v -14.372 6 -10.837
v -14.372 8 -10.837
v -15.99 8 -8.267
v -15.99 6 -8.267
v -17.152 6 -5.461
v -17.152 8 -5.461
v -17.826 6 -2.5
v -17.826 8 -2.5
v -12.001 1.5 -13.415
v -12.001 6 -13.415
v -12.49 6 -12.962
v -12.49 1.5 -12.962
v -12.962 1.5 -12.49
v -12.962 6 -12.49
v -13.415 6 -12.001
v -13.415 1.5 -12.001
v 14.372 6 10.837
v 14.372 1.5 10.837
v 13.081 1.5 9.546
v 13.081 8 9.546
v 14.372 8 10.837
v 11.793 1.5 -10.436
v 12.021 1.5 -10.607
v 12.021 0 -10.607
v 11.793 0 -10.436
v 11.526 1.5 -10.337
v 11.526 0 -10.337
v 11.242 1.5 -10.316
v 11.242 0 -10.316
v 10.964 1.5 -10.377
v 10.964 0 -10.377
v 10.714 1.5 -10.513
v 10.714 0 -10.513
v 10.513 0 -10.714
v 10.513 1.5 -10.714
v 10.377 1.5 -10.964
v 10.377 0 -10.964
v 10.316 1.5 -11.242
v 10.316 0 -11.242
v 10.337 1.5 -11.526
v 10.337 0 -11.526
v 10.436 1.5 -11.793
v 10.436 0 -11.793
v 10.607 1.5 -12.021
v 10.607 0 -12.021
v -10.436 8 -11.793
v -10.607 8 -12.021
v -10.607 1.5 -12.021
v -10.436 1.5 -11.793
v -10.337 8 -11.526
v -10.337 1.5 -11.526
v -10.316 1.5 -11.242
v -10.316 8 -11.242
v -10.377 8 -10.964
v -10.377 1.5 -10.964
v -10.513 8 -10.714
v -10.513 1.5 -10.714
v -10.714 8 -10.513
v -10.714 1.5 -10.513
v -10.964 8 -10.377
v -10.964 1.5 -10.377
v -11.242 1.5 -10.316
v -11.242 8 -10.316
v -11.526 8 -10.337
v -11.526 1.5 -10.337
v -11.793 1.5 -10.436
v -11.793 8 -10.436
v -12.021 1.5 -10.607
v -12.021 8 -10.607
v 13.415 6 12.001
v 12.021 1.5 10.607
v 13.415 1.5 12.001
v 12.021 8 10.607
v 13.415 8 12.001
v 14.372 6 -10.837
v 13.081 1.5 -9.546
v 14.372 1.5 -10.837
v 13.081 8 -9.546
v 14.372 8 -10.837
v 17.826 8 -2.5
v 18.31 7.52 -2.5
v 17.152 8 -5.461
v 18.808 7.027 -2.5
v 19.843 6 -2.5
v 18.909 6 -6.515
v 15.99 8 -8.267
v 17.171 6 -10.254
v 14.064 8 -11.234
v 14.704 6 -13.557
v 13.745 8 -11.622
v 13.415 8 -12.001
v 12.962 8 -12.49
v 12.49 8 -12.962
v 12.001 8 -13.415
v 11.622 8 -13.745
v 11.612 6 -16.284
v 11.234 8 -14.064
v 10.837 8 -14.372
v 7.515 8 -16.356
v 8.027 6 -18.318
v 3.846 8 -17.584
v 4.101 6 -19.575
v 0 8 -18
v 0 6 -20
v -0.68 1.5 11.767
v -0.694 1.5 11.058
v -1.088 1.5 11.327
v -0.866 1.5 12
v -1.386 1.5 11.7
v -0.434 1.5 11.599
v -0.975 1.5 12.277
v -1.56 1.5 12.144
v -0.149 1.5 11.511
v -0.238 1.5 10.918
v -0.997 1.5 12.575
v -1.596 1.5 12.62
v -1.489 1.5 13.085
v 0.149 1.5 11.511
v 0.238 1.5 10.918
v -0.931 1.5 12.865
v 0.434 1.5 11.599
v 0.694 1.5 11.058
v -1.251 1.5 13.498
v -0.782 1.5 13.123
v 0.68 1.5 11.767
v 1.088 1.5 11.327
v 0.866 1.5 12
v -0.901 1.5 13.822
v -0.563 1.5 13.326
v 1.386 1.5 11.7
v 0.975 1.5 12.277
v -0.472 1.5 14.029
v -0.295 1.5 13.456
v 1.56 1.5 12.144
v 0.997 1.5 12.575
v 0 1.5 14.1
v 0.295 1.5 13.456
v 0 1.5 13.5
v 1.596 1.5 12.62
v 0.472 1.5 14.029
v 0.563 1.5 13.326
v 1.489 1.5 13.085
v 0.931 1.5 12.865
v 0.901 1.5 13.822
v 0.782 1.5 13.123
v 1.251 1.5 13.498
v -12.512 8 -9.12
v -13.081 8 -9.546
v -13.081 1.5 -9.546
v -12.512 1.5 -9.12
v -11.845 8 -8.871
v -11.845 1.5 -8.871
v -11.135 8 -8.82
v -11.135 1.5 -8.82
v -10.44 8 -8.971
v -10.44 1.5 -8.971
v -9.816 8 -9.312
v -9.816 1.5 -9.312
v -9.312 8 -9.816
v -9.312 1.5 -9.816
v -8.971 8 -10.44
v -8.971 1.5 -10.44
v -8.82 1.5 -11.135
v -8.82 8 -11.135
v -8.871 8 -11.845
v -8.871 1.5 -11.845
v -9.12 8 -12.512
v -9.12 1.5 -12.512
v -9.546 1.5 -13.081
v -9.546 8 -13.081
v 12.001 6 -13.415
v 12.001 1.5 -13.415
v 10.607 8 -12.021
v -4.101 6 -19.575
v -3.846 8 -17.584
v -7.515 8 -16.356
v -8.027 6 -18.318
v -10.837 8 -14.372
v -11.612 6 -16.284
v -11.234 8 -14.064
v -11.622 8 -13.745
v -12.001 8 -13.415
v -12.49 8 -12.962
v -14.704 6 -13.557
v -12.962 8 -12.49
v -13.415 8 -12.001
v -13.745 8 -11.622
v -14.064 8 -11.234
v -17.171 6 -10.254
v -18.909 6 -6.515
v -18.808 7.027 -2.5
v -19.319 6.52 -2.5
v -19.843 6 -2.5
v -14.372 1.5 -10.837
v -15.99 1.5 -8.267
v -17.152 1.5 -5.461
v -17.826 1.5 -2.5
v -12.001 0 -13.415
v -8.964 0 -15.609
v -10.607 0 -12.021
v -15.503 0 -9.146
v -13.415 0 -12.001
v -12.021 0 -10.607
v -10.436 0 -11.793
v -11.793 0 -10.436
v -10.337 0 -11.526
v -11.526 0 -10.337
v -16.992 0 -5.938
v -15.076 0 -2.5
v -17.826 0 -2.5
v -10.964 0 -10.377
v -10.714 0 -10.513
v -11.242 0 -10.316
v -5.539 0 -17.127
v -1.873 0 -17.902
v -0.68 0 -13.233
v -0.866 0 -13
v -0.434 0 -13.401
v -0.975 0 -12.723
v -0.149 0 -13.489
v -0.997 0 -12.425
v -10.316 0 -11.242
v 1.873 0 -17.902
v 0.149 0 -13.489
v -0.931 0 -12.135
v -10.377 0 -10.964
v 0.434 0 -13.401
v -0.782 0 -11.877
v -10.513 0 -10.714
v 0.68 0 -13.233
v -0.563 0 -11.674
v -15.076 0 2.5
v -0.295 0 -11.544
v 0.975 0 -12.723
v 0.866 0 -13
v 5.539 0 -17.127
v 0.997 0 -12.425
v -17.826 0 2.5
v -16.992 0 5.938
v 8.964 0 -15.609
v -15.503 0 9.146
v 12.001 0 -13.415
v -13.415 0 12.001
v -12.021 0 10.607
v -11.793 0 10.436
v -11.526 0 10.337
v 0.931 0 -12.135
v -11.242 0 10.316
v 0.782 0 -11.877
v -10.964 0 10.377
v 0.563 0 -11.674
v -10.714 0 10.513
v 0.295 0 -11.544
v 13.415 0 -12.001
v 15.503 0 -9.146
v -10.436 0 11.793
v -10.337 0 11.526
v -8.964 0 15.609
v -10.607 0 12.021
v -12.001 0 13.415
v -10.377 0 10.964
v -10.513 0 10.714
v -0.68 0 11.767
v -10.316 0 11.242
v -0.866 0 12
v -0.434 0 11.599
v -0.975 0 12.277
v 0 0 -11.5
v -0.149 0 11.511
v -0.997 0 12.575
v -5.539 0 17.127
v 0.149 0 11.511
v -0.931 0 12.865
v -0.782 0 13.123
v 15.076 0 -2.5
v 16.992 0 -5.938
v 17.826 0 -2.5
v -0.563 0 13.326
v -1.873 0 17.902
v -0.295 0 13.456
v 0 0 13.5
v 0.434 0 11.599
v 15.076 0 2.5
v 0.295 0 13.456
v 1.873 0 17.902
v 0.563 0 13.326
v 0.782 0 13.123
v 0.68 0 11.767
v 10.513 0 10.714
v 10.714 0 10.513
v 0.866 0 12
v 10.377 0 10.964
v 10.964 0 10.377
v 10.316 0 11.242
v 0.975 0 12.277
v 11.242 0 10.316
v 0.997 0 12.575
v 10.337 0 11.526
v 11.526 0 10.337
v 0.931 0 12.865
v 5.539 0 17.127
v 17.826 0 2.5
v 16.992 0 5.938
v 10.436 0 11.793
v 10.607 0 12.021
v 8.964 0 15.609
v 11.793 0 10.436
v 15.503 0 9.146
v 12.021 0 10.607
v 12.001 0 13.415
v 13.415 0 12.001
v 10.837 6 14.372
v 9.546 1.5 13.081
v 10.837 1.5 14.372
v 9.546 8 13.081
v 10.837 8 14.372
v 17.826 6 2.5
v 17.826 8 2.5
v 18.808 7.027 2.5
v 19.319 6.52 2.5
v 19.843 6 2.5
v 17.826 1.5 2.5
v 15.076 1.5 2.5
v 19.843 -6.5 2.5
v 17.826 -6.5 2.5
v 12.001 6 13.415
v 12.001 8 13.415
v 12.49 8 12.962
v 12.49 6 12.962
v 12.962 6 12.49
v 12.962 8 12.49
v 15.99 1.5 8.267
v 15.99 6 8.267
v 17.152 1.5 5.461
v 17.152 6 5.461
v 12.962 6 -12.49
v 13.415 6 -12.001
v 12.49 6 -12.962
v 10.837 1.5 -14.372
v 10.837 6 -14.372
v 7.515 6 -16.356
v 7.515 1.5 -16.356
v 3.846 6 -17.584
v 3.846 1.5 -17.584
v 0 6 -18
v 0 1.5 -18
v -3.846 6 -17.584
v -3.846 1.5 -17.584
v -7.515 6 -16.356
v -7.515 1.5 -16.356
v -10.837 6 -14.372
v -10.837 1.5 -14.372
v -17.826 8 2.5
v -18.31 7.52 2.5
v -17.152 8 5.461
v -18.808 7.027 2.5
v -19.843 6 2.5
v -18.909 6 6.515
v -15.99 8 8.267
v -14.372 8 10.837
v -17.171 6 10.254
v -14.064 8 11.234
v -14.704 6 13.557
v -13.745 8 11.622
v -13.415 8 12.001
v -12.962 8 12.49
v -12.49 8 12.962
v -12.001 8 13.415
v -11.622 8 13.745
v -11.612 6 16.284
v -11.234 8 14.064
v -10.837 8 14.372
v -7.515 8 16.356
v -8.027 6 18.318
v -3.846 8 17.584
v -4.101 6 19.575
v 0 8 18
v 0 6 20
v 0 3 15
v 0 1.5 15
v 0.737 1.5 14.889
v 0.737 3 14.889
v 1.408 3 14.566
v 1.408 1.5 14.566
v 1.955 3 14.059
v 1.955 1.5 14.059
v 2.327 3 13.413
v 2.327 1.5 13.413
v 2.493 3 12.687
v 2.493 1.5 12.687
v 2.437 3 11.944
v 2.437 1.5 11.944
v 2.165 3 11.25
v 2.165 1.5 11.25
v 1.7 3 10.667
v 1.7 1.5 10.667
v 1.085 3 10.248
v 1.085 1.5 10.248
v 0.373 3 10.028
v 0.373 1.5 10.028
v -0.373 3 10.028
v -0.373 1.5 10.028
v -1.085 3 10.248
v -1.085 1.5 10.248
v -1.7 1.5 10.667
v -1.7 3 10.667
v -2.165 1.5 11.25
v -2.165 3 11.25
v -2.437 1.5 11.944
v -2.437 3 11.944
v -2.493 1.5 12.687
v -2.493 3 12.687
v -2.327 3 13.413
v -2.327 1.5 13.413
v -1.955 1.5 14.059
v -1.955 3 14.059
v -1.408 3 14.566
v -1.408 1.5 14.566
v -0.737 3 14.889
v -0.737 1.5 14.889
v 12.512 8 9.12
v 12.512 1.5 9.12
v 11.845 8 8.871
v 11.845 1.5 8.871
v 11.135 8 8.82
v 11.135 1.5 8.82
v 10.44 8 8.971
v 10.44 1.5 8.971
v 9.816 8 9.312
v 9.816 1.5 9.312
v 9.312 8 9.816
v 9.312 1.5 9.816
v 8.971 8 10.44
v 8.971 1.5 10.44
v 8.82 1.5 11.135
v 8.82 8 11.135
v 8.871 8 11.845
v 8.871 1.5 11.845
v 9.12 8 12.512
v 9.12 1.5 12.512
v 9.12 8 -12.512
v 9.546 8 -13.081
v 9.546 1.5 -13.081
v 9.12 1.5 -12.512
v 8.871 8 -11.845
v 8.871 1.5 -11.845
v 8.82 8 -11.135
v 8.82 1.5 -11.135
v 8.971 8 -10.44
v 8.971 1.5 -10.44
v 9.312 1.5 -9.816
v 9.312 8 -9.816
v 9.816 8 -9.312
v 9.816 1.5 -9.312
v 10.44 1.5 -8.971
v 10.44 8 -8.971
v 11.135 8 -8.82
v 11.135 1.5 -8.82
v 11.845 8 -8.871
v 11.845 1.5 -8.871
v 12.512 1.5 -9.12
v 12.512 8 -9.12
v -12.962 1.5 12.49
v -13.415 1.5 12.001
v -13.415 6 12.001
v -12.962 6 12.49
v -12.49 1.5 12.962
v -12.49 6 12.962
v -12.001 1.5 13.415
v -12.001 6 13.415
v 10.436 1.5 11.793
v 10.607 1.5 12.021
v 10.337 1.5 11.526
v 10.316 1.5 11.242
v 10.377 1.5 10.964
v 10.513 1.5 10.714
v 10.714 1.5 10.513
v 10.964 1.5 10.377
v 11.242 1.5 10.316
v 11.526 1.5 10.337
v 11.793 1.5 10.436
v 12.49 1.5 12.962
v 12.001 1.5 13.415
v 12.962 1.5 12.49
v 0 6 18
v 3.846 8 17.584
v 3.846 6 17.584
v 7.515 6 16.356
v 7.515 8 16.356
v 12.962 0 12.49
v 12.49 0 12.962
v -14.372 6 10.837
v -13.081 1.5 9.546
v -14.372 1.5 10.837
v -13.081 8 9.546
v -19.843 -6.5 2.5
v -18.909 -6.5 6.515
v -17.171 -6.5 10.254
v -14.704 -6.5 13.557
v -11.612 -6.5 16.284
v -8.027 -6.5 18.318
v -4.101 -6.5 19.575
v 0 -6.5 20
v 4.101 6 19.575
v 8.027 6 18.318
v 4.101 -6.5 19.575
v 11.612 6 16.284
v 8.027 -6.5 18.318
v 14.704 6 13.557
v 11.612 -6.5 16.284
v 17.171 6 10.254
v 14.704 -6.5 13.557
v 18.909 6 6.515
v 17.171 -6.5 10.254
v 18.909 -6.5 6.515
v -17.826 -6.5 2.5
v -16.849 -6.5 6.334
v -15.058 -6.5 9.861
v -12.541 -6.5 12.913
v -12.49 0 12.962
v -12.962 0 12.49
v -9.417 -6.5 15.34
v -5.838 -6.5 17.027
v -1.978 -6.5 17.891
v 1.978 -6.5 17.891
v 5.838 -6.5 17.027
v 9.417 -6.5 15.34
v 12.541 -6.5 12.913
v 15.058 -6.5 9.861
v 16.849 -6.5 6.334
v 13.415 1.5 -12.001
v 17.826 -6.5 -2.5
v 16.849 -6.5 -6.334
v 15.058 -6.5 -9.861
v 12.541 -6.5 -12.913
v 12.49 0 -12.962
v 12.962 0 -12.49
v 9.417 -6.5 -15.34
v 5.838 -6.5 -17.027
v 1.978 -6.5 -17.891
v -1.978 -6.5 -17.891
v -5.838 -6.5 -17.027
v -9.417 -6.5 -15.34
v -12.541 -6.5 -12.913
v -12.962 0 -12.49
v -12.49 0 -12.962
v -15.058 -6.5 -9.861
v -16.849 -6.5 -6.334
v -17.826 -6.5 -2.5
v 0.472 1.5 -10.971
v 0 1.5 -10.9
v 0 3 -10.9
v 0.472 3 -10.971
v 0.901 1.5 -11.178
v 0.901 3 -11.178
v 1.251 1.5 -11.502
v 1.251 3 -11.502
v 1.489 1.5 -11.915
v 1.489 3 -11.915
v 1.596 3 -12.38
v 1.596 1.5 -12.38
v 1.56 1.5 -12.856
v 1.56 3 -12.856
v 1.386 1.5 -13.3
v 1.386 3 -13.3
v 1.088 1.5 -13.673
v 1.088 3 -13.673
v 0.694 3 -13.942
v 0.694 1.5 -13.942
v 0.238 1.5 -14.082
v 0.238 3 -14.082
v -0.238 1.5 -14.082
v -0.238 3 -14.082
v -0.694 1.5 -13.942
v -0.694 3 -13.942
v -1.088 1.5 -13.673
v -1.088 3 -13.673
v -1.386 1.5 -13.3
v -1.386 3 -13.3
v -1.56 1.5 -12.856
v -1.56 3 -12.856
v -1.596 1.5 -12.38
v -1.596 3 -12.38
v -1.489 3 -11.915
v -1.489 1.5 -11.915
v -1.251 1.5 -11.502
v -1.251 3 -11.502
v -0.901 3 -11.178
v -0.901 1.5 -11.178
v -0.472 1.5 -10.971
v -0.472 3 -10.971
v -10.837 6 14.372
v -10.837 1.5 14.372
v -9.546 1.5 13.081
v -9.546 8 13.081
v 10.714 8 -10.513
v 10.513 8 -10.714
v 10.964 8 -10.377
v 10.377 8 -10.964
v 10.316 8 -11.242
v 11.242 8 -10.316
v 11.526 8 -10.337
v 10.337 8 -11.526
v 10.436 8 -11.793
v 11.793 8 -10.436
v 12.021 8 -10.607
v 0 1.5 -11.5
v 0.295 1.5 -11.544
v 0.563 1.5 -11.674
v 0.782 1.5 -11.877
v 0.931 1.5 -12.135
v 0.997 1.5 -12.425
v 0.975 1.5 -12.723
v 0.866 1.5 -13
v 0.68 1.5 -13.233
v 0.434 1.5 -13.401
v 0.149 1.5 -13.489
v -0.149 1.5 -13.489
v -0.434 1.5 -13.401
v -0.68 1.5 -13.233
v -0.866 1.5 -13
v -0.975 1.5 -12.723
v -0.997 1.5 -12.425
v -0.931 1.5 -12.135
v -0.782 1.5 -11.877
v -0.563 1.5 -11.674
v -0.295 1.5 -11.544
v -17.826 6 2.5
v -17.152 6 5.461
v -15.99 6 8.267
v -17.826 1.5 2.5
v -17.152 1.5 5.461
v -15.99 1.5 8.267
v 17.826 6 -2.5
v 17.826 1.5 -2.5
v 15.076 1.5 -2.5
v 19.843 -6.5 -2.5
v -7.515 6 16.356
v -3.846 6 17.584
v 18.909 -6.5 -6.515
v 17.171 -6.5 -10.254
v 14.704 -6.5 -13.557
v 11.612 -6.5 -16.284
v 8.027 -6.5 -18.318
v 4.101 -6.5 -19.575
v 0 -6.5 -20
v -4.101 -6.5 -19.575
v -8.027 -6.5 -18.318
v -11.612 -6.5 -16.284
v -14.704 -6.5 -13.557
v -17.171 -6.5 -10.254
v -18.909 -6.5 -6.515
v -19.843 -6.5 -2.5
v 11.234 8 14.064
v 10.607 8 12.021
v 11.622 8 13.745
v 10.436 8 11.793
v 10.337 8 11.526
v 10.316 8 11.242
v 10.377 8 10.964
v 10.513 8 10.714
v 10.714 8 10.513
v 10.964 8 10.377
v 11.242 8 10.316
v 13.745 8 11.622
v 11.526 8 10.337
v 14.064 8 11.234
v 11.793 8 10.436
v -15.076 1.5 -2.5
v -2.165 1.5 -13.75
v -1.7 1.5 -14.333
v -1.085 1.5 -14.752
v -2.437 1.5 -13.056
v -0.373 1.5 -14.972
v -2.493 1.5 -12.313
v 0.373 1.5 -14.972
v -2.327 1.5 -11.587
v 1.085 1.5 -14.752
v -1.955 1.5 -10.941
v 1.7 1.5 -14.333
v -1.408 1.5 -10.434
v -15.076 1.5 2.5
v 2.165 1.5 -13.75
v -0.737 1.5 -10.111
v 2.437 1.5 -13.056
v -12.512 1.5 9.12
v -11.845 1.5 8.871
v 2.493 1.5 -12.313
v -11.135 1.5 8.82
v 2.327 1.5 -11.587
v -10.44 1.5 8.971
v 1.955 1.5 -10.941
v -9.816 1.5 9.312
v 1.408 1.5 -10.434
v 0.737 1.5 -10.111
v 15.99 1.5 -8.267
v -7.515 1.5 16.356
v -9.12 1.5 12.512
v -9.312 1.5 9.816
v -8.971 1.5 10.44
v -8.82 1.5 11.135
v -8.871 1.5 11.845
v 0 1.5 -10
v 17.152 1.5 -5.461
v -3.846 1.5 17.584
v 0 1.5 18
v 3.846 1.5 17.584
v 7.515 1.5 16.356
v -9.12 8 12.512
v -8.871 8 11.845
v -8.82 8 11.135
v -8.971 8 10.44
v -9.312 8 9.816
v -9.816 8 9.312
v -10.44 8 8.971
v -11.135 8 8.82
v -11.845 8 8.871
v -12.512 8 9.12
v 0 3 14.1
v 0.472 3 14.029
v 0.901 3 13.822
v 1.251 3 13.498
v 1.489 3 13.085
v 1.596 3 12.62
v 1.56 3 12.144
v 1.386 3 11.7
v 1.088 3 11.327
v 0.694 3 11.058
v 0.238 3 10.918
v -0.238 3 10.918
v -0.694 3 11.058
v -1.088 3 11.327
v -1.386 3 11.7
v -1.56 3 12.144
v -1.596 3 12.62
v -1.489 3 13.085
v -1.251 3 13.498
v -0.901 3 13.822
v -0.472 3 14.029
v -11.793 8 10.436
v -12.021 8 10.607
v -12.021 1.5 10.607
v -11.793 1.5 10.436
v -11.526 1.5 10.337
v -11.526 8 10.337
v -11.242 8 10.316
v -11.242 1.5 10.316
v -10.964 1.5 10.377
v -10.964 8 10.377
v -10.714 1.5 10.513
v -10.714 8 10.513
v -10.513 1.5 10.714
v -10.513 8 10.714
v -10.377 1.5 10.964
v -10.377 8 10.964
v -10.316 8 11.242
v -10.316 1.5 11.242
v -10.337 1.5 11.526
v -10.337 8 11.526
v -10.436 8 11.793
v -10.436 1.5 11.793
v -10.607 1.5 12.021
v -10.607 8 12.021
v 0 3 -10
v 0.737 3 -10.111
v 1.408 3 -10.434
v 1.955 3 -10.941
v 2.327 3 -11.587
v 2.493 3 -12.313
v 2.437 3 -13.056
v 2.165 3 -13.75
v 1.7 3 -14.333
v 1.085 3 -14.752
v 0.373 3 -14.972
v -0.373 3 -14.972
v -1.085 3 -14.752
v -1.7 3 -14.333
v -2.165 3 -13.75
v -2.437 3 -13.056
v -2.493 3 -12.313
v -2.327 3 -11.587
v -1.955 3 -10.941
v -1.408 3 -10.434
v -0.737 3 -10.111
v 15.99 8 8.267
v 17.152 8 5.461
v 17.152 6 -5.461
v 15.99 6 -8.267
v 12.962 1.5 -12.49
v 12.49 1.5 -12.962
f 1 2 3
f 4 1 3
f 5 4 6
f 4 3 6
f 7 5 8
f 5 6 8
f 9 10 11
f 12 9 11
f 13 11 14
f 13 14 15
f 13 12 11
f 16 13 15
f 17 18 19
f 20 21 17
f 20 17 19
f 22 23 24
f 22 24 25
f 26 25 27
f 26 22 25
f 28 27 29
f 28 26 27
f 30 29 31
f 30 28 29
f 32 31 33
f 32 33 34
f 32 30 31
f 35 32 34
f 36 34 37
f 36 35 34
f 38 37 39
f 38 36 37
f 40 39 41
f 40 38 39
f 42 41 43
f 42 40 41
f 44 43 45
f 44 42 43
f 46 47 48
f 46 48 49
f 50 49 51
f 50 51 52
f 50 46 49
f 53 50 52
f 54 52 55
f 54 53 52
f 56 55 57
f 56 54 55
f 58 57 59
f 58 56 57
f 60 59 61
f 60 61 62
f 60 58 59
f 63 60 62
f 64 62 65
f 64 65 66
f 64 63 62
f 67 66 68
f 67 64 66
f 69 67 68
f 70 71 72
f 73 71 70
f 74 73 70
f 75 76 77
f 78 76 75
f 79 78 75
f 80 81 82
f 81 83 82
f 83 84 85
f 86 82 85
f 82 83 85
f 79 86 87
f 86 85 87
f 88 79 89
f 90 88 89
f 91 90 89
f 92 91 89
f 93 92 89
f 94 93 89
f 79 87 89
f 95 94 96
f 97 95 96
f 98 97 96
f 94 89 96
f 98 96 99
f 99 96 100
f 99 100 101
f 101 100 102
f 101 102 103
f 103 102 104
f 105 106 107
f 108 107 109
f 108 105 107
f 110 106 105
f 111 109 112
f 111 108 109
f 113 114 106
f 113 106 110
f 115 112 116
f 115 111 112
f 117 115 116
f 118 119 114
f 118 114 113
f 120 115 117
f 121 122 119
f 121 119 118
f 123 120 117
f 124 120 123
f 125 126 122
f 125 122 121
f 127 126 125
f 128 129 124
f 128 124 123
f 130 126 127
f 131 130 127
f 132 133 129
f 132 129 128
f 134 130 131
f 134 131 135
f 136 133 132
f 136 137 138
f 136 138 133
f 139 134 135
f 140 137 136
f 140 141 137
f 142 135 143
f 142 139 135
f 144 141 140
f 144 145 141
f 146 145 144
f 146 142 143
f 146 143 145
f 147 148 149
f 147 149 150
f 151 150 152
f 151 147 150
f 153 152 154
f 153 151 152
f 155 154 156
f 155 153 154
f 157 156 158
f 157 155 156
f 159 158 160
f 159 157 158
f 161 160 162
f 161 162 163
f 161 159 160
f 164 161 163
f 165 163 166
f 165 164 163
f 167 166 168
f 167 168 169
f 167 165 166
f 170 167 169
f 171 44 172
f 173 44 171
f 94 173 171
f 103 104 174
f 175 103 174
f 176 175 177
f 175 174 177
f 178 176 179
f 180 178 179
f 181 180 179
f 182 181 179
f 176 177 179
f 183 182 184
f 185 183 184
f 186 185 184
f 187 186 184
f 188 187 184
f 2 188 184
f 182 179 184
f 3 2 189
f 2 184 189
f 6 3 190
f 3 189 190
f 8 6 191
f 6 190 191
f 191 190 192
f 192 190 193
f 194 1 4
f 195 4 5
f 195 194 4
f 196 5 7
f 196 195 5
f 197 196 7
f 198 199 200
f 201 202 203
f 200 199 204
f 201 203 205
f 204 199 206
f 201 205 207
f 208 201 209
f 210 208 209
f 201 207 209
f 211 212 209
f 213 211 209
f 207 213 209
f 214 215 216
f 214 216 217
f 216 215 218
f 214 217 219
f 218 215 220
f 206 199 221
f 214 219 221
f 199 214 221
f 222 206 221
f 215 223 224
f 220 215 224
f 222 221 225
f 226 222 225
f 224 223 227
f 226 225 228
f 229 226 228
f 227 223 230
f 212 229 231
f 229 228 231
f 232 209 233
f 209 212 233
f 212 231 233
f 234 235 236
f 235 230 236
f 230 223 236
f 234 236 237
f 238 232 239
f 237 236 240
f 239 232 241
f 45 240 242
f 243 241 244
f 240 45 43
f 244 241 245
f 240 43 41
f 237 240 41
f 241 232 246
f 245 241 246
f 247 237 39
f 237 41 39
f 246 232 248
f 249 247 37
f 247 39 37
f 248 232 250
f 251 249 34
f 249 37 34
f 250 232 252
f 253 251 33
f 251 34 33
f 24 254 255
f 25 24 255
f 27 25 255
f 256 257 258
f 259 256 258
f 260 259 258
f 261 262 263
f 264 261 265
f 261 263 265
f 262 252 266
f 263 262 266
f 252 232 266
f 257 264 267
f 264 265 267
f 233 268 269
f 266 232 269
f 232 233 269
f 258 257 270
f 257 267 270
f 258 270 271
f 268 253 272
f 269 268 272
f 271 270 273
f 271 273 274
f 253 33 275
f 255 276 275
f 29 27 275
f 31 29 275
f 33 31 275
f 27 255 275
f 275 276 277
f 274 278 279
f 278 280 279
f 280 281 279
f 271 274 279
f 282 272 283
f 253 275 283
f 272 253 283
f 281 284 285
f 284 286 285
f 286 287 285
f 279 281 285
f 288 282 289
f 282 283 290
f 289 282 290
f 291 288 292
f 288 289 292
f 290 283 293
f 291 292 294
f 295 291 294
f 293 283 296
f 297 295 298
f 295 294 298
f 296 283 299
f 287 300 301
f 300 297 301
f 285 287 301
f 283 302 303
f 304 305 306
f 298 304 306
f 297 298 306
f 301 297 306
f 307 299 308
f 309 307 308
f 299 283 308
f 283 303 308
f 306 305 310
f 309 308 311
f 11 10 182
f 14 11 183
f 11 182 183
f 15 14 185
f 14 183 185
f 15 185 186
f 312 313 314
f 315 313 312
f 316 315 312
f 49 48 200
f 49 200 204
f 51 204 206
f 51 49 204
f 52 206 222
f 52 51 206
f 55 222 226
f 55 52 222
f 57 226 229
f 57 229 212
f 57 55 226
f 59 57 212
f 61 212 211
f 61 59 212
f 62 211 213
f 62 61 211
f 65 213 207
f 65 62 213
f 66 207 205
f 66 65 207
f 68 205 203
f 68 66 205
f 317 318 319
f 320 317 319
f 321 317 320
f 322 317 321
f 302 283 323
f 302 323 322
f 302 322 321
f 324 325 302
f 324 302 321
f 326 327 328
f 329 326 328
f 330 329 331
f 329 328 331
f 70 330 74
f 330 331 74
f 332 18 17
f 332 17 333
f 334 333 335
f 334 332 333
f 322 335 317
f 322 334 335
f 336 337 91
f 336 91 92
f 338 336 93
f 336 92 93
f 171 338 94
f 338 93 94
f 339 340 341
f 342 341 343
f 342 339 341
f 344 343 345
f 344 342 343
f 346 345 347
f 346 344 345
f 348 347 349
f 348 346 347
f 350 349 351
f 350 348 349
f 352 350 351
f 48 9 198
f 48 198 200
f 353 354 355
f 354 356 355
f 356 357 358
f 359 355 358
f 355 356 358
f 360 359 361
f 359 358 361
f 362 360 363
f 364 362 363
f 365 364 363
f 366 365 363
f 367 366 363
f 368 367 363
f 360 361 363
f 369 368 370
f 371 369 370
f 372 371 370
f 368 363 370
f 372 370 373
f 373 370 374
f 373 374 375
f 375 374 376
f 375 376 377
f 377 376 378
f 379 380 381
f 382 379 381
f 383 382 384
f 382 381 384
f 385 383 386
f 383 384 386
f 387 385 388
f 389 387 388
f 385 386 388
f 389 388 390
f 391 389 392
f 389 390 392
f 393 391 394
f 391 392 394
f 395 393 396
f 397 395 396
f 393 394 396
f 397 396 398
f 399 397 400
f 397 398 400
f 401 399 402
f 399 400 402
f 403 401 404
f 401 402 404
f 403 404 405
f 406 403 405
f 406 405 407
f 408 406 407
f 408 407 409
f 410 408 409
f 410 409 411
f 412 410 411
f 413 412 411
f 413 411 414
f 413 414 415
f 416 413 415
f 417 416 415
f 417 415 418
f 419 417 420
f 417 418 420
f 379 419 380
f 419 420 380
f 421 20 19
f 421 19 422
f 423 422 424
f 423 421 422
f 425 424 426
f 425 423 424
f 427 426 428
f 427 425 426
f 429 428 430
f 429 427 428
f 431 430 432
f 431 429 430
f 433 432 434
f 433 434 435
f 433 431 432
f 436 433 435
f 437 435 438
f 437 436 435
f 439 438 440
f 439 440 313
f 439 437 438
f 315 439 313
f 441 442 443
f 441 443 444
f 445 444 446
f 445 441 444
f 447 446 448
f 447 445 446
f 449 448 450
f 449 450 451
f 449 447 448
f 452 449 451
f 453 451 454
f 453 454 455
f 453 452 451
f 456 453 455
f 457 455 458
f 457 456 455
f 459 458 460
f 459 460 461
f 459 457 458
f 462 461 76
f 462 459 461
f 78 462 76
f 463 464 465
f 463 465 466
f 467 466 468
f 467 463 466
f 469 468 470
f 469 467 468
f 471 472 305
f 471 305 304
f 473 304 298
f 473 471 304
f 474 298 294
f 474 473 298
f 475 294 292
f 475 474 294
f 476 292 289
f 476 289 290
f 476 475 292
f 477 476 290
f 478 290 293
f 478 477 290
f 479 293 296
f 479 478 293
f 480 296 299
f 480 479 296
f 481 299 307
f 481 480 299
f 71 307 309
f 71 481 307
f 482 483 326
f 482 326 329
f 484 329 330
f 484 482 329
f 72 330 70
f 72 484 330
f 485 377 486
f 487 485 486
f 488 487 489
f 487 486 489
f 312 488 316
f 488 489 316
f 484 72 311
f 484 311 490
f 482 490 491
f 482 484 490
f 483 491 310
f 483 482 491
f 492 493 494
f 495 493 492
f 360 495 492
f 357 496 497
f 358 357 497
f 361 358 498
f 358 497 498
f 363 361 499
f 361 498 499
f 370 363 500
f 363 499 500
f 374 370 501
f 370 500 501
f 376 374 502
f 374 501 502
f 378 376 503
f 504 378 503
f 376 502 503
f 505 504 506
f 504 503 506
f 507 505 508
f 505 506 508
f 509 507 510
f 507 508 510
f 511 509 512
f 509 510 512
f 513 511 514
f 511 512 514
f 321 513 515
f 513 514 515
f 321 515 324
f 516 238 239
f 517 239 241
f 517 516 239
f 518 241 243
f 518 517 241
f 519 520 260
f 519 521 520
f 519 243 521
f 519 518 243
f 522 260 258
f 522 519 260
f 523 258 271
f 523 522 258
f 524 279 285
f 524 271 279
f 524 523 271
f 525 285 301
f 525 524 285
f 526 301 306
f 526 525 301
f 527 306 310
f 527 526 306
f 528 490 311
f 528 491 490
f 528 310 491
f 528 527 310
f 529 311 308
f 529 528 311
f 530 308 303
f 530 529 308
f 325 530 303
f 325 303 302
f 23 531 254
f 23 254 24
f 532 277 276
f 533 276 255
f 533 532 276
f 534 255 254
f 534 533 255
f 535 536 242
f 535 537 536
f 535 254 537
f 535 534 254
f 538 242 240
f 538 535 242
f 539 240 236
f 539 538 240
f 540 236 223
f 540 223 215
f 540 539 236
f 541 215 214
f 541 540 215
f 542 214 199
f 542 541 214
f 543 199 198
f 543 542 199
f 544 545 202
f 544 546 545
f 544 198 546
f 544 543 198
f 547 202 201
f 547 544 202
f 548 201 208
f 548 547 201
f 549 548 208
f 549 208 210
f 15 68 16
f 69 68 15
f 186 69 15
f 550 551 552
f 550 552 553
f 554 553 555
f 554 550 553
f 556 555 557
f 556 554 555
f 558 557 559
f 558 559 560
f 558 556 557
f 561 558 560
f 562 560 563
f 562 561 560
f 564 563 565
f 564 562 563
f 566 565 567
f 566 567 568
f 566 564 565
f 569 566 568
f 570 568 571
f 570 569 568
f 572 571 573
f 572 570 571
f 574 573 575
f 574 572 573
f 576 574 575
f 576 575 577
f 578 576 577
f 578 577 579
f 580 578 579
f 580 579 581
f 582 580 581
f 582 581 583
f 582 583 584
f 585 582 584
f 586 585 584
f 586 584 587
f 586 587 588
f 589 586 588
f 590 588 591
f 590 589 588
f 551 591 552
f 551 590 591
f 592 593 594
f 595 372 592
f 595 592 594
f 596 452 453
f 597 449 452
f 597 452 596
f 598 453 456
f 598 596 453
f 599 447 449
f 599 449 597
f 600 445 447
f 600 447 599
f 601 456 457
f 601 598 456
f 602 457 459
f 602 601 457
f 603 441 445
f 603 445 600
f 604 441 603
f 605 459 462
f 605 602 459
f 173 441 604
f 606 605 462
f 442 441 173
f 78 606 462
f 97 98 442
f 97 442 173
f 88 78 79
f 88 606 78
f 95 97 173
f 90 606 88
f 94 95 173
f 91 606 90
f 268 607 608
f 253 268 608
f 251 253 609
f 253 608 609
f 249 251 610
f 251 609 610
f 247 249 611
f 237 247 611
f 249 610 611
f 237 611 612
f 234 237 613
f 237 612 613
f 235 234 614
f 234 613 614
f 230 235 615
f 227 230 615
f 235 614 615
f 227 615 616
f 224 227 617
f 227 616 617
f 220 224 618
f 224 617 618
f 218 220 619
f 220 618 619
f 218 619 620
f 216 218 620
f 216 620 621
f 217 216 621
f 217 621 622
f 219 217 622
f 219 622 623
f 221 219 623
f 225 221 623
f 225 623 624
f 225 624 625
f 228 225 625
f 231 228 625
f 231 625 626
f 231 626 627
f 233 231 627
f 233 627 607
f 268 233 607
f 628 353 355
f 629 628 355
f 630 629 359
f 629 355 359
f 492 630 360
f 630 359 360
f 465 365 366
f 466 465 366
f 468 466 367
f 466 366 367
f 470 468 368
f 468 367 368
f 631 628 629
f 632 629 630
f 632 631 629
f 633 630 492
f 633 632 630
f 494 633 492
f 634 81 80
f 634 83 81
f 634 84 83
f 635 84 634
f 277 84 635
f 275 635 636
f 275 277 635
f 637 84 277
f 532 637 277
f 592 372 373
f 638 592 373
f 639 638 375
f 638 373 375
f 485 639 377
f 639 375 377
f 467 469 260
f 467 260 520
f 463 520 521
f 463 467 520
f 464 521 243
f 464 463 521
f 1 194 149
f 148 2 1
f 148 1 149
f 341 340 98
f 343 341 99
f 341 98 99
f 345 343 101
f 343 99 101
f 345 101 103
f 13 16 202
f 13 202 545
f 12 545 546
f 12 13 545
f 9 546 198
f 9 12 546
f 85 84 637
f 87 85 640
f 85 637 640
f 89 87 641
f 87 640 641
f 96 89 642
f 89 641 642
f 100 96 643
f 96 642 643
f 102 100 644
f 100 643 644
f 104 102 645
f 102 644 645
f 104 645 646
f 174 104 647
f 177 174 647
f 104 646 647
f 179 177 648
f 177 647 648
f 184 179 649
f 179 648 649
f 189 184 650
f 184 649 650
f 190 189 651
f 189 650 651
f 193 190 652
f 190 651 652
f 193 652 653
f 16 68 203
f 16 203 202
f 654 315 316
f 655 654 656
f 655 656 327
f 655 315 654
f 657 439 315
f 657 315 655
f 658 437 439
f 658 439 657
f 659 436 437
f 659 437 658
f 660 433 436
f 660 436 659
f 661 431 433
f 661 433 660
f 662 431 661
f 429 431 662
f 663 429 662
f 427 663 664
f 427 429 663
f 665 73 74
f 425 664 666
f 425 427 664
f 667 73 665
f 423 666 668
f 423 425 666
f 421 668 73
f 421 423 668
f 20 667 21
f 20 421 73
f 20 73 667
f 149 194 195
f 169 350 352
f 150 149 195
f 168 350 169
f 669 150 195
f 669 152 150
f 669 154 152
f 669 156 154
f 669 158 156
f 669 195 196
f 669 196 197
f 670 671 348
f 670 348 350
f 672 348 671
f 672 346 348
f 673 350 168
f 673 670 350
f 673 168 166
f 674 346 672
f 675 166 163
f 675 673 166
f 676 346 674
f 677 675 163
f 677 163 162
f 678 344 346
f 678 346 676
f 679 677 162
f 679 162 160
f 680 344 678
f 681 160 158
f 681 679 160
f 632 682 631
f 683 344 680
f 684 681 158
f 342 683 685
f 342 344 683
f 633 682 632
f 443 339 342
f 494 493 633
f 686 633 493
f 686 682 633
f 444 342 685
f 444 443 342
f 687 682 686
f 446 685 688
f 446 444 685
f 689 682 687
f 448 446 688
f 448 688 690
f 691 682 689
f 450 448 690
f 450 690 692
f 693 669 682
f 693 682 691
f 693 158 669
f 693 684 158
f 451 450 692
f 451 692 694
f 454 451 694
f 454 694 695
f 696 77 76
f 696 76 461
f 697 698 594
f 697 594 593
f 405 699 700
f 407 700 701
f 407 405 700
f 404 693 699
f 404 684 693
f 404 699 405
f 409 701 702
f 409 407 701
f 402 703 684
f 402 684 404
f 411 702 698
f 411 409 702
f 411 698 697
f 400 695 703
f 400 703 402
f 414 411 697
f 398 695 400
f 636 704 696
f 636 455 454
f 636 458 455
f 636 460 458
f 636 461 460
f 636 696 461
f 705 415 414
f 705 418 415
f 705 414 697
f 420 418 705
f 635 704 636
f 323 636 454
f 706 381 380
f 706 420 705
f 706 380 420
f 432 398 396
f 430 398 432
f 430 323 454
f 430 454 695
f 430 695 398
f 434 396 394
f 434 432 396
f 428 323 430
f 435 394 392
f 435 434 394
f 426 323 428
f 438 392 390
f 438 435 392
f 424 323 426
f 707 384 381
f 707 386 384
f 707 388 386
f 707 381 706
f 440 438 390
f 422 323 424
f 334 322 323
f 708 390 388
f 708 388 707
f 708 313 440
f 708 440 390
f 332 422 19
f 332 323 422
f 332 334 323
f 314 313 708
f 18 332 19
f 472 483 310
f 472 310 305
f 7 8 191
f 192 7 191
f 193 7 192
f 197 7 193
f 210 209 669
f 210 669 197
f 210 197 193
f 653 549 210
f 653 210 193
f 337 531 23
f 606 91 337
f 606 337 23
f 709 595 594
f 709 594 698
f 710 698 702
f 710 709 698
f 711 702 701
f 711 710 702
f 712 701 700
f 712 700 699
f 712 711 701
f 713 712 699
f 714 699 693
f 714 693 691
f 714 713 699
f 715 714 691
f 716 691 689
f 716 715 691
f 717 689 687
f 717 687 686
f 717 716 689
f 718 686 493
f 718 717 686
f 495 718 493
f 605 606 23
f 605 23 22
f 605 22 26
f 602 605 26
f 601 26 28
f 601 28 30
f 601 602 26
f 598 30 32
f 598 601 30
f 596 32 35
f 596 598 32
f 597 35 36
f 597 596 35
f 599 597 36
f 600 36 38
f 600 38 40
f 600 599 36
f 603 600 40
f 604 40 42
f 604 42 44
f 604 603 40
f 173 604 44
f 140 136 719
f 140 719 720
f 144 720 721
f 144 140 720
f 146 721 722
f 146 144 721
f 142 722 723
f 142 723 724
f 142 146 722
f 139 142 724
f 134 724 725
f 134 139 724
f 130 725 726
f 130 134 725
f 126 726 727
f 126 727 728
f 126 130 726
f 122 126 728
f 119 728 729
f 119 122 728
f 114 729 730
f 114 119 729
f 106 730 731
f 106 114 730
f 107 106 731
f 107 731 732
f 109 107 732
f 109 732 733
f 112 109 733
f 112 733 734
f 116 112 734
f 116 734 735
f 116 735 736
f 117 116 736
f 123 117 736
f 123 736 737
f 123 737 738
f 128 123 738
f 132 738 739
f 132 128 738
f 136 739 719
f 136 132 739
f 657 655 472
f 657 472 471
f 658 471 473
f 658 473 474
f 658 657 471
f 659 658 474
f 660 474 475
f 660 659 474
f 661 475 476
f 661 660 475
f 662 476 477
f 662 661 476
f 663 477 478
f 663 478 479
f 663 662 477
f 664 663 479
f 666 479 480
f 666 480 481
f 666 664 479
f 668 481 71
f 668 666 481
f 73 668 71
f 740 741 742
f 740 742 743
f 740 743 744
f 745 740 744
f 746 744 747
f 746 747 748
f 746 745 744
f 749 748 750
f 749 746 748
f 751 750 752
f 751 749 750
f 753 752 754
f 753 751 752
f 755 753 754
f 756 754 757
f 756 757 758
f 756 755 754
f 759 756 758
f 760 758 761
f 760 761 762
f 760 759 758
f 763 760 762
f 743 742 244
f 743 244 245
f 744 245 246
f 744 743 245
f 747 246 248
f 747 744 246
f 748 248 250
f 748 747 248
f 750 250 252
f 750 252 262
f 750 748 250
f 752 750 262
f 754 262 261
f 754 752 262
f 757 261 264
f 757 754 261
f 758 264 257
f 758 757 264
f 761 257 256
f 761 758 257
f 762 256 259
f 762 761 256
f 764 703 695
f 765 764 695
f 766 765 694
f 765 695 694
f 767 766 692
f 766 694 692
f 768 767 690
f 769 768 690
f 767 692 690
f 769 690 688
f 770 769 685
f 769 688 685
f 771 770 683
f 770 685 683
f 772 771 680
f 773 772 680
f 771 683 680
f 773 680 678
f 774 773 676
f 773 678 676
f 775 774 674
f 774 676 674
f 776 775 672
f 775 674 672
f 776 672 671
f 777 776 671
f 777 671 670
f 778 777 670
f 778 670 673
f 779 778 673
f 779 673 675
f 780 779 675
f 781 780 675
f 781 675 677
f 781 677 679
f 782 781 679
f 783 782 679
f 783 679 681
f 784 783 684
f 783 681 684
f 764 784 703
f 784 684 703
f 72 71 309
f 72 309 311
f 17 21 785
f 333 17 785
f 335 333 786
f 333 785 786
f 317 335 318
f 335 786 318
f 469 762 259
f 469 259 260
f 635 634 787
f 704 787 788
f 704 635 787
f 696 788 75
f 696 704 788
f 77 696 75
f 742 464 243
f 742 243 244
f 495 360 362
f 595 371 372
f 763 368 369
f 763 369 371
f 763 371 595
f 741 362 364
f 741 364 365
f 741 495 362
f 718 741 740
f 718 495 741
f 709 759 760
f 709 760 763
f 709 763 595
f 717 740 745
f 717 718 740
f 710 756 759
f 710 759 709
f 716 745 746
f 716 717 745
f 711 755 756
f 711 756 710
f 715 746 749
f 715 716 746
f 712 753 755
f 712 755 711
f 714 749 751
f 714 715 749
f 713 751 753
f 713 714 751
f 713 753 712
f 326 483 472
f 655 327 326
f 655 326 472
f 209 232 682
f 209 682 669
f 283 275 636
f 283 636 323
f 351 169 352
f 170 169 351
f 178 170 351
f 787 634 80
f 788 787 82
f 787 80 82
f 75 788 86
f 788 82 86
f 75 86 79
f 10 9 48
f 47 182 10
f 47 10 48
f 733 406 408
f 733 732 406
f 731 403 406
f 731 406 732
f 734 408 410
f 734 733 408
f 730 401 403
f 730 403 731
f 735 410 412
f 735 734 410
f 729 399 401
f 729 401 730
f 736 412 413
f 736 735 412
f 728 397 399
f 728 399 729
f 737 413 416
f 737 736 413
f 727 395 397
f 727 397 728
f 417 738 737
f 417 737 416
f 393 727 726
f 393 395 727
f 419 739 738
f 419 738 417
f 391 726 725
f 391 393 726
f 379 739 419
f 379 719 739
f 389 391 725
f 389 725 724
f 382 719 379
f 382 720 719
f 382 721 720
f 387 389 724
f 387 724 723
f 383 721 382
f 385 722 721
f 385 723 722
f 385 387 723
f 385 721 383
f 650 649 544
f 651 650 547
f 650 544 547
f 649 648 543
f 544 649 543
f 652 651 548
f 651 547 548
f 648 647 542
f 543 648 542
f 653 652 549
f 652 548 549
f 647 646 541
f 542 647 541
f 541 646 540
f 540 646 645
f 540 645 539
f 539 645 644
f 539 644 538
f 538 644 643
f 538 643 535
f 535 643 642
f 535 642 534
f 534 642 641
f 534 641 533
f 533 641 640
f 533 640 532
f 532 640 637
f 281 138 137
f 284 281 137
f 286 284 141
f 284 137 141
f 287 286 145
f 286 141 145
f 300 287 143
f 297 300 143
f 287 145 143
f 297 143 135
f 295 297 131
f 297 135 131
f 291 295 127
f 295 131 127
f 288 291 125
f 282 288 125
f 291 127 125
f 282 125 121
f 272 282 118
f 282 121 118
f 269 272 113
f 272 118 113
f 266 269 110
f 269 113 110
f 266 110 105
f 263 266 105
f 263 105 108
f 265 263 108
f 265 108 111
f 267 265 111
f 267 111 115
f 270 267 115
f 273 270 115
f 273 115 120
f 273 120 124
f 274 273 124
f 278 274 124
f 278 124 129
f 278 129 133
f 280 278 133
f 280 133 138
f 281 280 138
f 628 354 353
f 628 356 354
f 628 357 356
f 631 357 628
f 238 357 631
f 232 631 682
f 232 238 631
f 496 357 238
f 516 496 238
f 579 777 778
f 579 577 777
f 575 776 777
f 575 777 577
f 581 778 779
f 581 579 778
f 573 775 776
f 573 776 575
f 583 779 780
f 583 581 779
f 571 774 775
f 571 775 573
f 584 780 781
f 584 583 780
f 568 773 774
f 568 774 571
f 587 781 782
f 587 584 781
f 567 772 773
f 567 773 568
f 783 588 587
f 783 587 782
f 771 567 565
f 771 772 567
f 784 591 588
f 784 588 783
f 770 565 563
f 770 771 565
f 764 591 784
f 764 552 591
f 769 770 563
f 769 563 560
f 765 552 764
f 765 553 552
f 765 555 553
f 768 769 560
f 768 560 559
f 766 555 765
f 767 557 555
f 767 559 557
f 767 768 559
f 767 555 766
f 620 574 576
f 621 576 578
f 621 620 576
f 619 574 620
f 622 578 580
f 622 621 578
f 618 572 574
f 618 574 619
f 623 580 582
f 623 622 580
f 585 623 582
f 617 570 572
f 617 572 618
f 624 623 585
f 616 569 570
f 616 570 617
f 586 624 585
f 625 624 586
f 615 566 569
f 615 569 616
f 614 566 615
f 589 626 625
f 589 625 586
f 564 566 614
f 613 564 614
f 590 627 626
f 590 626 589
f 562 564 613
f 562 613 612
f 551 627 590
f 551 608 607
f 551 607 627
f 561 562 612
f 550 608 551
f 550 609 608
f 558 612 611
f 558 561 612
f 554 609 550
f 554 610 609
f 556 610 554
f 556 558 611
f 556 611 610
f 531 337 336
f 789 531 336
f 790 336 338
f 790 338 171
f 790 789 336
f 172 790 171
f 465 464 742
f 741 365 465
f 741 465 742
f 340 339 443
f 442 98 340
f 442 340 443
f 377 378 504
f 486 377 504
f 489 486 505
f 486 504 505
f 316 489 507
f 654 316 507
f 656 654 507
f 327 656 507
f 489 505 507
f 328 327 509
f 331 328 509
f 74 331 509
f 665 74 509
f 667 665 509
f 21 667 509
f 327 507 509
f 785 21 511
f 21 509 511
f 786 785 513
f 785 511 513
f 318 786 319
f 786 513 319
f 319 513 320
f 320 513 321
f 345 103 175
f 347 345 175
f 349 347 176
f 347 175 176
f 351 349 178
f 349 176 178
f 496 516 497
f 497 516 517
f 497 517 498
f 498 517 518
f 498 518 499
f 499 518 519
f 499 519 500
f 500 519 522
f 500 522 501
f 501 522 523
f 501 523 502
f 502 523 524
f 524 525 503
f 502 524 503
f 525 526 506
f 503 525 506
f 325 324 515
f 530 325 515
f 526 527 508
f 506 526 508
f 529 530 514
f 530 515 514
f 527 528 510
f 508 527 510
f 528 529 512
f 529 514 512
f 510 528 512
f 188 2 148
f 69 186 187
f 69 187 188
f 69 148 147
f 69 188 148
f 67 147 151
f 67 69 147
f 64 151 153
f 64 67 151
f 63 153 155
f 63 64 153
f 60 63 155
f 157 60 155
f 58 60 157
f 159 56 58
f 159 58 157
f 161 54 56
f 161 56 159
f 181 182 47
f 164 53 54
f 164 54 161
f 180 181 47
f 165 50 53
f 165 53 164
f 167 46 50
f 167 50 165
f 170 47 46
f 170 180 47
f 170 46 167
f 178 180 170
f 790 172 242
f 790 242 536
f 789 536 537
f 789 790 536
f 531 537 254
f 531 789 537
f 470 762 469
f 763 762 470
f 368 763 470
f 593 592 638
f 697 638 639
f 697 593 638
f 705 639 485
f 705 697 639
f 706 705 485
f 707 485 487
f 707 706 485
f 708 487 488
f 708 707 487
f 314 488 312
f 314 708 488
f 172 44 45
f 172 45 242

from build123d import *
from build123d.topology import SkipClean

# Parameters (mm, degrees)
SKETCH_1_R               = 18
EXTRUDE_1_DEPTH          = 1.5
EXTRUDE_2_DEPTH          = 6
EXTRUDE_2_DEPTH_BACK     = 6.5
SKETCH_2_R               = 20
SKETCH_2_R_2             = 18
CUT_EXTRUDE_START        = 1.5
SKETCH_6_R               = 1
CUT_EXTRUDE_4_DEPTH      = 8
CUT_EXTRUDE_5_DEPTH      = 30.393876913
CUT_EXTRUDE_5_DEPTH_BACK = 30.393876913
CUT_EXTRUDE_6_DEPTH      = 1.5
EXTRUDE_START            = 8
EXTRUDE_3_DEPTH          = 6.5
EXTRUDE_START_2          = 1.5
SKETCH_10_R              = 2.5
SKETCH_10_R_2            = 1.6
EXTRUDE_4_DEPTH          = 1.5


with BuildPart() as part:
    # 草图1 → 凸台-拉伸1 (new body)
    with BuildSketch(Plane(origin=(0, 0, 0), x_dir=(1, 0, 0), z_dir=(0, 1, 0))):
        with Locations(Location((0, 0, 0), (0, 0, 270))):
            Circle(SKETCH_1_R)
    extrude(amount=EXTRUDE_1_DEPTH)

    # 草图2 → 凸台-拉伸2 (add, two sides: drawn at the far end of the back side and taken through both)
    with BuildSketch(Plane(origin=(0, 0, 0), x_dir=(1, 0, 0), z_dir=(0, 1, 0)).offset(-EXTRUDE_2_DEPTH_BACK)):
        with Locations(Location((0, 0, 0), (0, 0, 270))):
            Circle(SKETCH_2_R)
        with Locations(Location((0, 0, 0), (0, 0, 270))):
            Circle(SKETCH_2_R_2, mode=Mode.SUBTRACT)
    extrude(amount=EXTRUDE_2_DEPTH + EXTRUDE_2_DEPTH_BACK)

    # 扫描2: sweep along a curve in space
    with SkipClean():  # the faces are left unmerged after this step: merging them gives an invalid solid
        with BuildLine() as sweep_2_path:
            ThreePointArc((0, 6, 18), (12.727922061, 6, 12.727922061), (18, 6, 0))
            ThreePointArc((18, 6, 0), (12.727922061, 6, -12.727922061), (0, 6, -18))
            ThreePointArc((0, 6, -18), (-12.727922061, 6, -12.727922061), (-18, 6, 0))
            ThreePointArc((-18, 6, 0), (-12.727922061, 6, 12.727922061), (0, 6, 18))
        # 草图5 → 扫描2 (sweep)
        with BuildSketch(Plane.XY):
            Polygon((-20, 6), (-18, 6), (-18, 8), align=None)
        sweep(path=sweep_2_path.line)

    # 草图6 → 切除-拉伸4 (cut)
    with SkipClean():  # the faces are left unmerged after this step: merging them gives an invalid solid
        with BuildSketch(Plane(origin=(0, 0, 0), x_dir=(1, 0, 0), z_dir=(0, 1, 0)).offset(CUT_EXTRUDE_START)):
            with Locations(Location((0, -12.5, 0), (0, 0, 270))):
                Circle(SKETCH_6_R)
            with Locations(Location((0, 12.5, 0), (0, 0, 270))):
                Circle(SKETCH_6_R)
        extrude(amount=-CUT_EXTRUDE_4_DEPTH, mode=Mode.SUBTRACT)

    # 草图7 → 切除-拉伸5 (cut, two sides: drawn at the far end of the back side and taken through both)
    with BuildSketch(Plane(origin=(0, 0, 0), x_dir=(1, 0, 0), z_dir=(0, 1, 0)).offset(-CUT_EXTRUDE_5_DEPTH_BACK)):
        with BuildLine():
            Line((-19.843134833, -2.5), (-15.07554347, -2.5))
            Line((-15.07554347, -2.5), (-15.07554347, 2.5))
            Line((-15.07554347, 2.5), (-19.843134833, 2.5))
            ThreePointArc((-19.843134833, 2.5), (-20, 0), (-19.843134833, -2.5))
        make_face()
        with BuildLine():
            Line((15.07554347, 2.5), (15.07554347, -2.5))
            Line((15.07554347, -2.5), (19.843134833, -2.5))
            ThreePointArc((19.843134833, -2.5), (20, 0), (19.843134833, 2.5))
            Line((19.843134833, 2.5), (15.07554347, 2.5))
        make_face()
    extrude(amount=CUT_EXTRUDE_5_DEPTH + CUT_EXTRUDE_5_DEPTH_BACK, mode=Mode.SUBTRACT)

    # 草图8 → 切除-拉伸6 (cut)
    with SkipClean():  # the faces are left unmerged after this step: merging them gives an invalid solid
        with BuildSketch(Plane(origin=(0, 0, 0), x_dir=(1, 0, 0), z_dir=(0, 1, 0)).offset(CUT_EXTRUDE_START)):
            with BuildLine():
                Line((10.606601706, 12.020815293), (12.001158233, 13.41537182))
                ThreePointArc((12.001158233, 13.41537182), (12.727922049, 12.727922074), (13.415371797, 12.001158259))
                Line((13.415371797, 12.001158259), (12.020815268, 10.606601731))
                ThreePointArc((12.020815268, 10.606601731), (10.606601706, 10.606601706), (10.606601706, 12.020815293))
            make_face()
            with BuildLine():
                Line((12.020815268, -10.606601731), (13.415371797, -12.001158259))
                ThreePointArc((13.415371797, -12.001158259), (12.727922049, -12.727922074), (12.001158233, -13.41537182))
                Line((12.001158233, -13.41537182), (10.606601706, -12.020815293))
                ThreePointArc((10.606601706, -12.020815293), (10.606601706, -10.606601706), (12.020815268, -10.606601731))
            make_face()
            with BuildLine():
                Line((-10.606601706, -12.020815293), (-12.001158233, -13.41537182))
                ThreePointArc((-12.001158233, -13.41537182), (-12.727922049, -12.727922074), (-13.415371797, -12.001158259))
                Line((-13.415371797, -12.001158259), (-12.020815268, -10.606601731))
                ThreePointArc((-12.020815268, -10.606601731), (-10.606601706, -10.606601706), (-10.606601706, -12.020815293))
            make_face()
            with BuildLine():
                Line((-12.020815268, 10.606601731), (-13.415371797, 12.001158259))
                ThreePointArc((-13.415371797, 12.001158259), (-12.727922049, 12.727922074), (-12.001158233, 13.41537182))
                Line((-12.001158233, 13.41537182), (-10.606601706, 12.020815293))
                ThreePointArc((-10.606601706, 12.020815293), (-10.606601706, 10.606601706), (-12.020815268, 10.606601731))
            make_face()
        extrude(amount=-CUT_EXTRUDE_6_DEPTH, mode=Mode.SUBTRACT)

    # 草图9 → 凸台-拉伸3 (add)
    with SkipClean():  # the faces are left unmerged after this step: merging them gives an invalid solid
        with BuildSketch(Plane(origin=(0, 0, 0), x_dir=(1, 0, 0), z_dir=(0, 1, 0)).offset(EXTRUDE_START)):
            with BuildLine():
                Line((12.020815268, -10.606601731), (13.415371797, -12.001158259))
                ThreePointArc((13.415371797, -12.001158259), (13.906042657, -11.428997228), (14.372329608, -10.836795727))
                Line((14.372329608, -10.836795727), (13.081475446, -9.545941553))
                ThreePointArc((13.081475446, -9.545941553), (9.545941558, -9.545941548), (9.545941537, -13.081475443))
                Line((9.545941537, -13.081475443), (10.8367957, -14.372329629))
                ThreePointArc((10.8367957, -14.372329629), (11.428997201, -13.906042679), (12.001158233, -13.41537182))
                Line((12.001158233, -13.41537182), (10.606601718, -12.020815281))
                ThreePointArc((10.606601718, -12.020815281), (10.606601731, -10.606601731), (12.020815268, -10.606601731))
            make_face()
            with BuildLine():
                Line((-10.606601718, -12.020815281), (-12.001158233, -13.41537182))
                ThreePointArc((-12.001158233, -13.41537182), (-11.428997201, -13.906042679), (-10.8367957, -14.372329629))
                Line((-10.8367957, -14.372329629), (-9.545941547, -13.081475453))
                ThreePointArc((-9.545941547, -13.081475453), (-9.545941551, -9.545941542), (-13.081475462, -9.545941556))
                Line((-13.081475462, -9.545941556), (-14.372329609, -10.836795726))
                ThreePointArc((-14.372329609, -10.836795726), (-13.906042657, -11.428997227), (-13.415371797, -12.001158259))
                Line((-13.415371797, -12.001158259), (-12.020815281, -10.606601718))
                ThreePointArc((-12.020815281, -10.606601718), (-10.606601718, -10.606601718), (-10.606601718, -12.020815281))
            make_face()
            with BuildLine():
                Line((10.606601718, 12.020815281), (12.001158233, 13.41537182))
                ThreePointArc((12.001158233, 13.41537182), (11.428997201, 13.906042679), (10.8367957, 14.372329629))
                Line((10.8367957, 14.372329629), (9.545941547, 13.081475453))
                ThreePointArc((9.545941547, 13.081475453), (9.545941551, 9.545941542), (13.081475462, 9.545941556))
                Line((13.081475462, 9.545941556), (14.372329609, 10.836795726))
                ThreePointArc((14.372329609, 10.836795726), (13.906042657, 11.428997227), (13.415371797, 12.001158259))
                Line((13.415371797, 12.001158259), (12.020815281, 10.606601718))
                ThreePointArc((12.020815281, 10.606601718), (10.606601718, 10.606601718), (10.606601718, 12.020815281))
            make_face()
            with BuildLine():
                Line((-12.020815268, 10.606601731), (-13.415371797, 12.001158259))
                ThreePointArc((-13.415371797, 12.001158259), (-13.906042657, 11.428997228), (-14.372329608, 10.836795727))
                Line((-14.372329608, 10.836795727), (-13.081475446, 9.545941553))
                ThreePointArc((-13.081475446, 9.545941553), (-9.545941558, 9.545941548), (-9.545941537, 13.081475443))
                Line((-9.545941537, 13.081475443), (-10.8367957, 14.372329629))
                ThreePointArc((-10.8367957, 14.372329629), (-11.428997201, 13.906042679), (-12.001158233, 13.41537182))
                Line((-12.001158233, 13.41537182), (-10.606601718, 12.020815281))
                ThreePointArc((-10.606601718, 12.020815281), (-10.606601731, 10.606601731), (-12.020815268, 10.606601731))
            make_face()
        extrude(amount=-EXTRUDE_3_DEPTH)

    # 草图10 → 凸台-拉伸4 (add)
    # profile 1 of 2: a face of its own
    with SkipClean():  # the faces are left unmerged after this step: merging them gives an invalid solid
        with BuildSketch(Plane(origin=(0, 0, 0), x_dir=(1, 0, 0), z_dir=(0, 1, 0)).offset(EXTRUDE_START_2)):
            with Locations(Location((0, 12.5, 0), (0, 0, 270))):
                Circle(SKETCH_10_R)
            with Locations(Location((0, 12.5, 0), (0, 0, 270))):
                Circle(SKETCH_10_R_2, mode=Mode.SUBTRACT)
        # profile 2 of 2: a face of its own
        with BuildSketch(Plane(origin=(0, 0, 0), x_dir=(1, 0, 0), z_dir=(0, 1, 0)).offset(EXTRUDE_START_2)):
            with Locations(Location((0, -12.5, 0), (0, 0, 270))):
                Circle(SKETCH_10_R)
            with Locations(Location((0, -12.5, 0), (0, 0, 270))):
                Circle(SKETCH_10_R_2, mode=Mode.SUBTRACT)
        extrude(amount=EXTRUDE_4_DEPTH)


solid = part.part
